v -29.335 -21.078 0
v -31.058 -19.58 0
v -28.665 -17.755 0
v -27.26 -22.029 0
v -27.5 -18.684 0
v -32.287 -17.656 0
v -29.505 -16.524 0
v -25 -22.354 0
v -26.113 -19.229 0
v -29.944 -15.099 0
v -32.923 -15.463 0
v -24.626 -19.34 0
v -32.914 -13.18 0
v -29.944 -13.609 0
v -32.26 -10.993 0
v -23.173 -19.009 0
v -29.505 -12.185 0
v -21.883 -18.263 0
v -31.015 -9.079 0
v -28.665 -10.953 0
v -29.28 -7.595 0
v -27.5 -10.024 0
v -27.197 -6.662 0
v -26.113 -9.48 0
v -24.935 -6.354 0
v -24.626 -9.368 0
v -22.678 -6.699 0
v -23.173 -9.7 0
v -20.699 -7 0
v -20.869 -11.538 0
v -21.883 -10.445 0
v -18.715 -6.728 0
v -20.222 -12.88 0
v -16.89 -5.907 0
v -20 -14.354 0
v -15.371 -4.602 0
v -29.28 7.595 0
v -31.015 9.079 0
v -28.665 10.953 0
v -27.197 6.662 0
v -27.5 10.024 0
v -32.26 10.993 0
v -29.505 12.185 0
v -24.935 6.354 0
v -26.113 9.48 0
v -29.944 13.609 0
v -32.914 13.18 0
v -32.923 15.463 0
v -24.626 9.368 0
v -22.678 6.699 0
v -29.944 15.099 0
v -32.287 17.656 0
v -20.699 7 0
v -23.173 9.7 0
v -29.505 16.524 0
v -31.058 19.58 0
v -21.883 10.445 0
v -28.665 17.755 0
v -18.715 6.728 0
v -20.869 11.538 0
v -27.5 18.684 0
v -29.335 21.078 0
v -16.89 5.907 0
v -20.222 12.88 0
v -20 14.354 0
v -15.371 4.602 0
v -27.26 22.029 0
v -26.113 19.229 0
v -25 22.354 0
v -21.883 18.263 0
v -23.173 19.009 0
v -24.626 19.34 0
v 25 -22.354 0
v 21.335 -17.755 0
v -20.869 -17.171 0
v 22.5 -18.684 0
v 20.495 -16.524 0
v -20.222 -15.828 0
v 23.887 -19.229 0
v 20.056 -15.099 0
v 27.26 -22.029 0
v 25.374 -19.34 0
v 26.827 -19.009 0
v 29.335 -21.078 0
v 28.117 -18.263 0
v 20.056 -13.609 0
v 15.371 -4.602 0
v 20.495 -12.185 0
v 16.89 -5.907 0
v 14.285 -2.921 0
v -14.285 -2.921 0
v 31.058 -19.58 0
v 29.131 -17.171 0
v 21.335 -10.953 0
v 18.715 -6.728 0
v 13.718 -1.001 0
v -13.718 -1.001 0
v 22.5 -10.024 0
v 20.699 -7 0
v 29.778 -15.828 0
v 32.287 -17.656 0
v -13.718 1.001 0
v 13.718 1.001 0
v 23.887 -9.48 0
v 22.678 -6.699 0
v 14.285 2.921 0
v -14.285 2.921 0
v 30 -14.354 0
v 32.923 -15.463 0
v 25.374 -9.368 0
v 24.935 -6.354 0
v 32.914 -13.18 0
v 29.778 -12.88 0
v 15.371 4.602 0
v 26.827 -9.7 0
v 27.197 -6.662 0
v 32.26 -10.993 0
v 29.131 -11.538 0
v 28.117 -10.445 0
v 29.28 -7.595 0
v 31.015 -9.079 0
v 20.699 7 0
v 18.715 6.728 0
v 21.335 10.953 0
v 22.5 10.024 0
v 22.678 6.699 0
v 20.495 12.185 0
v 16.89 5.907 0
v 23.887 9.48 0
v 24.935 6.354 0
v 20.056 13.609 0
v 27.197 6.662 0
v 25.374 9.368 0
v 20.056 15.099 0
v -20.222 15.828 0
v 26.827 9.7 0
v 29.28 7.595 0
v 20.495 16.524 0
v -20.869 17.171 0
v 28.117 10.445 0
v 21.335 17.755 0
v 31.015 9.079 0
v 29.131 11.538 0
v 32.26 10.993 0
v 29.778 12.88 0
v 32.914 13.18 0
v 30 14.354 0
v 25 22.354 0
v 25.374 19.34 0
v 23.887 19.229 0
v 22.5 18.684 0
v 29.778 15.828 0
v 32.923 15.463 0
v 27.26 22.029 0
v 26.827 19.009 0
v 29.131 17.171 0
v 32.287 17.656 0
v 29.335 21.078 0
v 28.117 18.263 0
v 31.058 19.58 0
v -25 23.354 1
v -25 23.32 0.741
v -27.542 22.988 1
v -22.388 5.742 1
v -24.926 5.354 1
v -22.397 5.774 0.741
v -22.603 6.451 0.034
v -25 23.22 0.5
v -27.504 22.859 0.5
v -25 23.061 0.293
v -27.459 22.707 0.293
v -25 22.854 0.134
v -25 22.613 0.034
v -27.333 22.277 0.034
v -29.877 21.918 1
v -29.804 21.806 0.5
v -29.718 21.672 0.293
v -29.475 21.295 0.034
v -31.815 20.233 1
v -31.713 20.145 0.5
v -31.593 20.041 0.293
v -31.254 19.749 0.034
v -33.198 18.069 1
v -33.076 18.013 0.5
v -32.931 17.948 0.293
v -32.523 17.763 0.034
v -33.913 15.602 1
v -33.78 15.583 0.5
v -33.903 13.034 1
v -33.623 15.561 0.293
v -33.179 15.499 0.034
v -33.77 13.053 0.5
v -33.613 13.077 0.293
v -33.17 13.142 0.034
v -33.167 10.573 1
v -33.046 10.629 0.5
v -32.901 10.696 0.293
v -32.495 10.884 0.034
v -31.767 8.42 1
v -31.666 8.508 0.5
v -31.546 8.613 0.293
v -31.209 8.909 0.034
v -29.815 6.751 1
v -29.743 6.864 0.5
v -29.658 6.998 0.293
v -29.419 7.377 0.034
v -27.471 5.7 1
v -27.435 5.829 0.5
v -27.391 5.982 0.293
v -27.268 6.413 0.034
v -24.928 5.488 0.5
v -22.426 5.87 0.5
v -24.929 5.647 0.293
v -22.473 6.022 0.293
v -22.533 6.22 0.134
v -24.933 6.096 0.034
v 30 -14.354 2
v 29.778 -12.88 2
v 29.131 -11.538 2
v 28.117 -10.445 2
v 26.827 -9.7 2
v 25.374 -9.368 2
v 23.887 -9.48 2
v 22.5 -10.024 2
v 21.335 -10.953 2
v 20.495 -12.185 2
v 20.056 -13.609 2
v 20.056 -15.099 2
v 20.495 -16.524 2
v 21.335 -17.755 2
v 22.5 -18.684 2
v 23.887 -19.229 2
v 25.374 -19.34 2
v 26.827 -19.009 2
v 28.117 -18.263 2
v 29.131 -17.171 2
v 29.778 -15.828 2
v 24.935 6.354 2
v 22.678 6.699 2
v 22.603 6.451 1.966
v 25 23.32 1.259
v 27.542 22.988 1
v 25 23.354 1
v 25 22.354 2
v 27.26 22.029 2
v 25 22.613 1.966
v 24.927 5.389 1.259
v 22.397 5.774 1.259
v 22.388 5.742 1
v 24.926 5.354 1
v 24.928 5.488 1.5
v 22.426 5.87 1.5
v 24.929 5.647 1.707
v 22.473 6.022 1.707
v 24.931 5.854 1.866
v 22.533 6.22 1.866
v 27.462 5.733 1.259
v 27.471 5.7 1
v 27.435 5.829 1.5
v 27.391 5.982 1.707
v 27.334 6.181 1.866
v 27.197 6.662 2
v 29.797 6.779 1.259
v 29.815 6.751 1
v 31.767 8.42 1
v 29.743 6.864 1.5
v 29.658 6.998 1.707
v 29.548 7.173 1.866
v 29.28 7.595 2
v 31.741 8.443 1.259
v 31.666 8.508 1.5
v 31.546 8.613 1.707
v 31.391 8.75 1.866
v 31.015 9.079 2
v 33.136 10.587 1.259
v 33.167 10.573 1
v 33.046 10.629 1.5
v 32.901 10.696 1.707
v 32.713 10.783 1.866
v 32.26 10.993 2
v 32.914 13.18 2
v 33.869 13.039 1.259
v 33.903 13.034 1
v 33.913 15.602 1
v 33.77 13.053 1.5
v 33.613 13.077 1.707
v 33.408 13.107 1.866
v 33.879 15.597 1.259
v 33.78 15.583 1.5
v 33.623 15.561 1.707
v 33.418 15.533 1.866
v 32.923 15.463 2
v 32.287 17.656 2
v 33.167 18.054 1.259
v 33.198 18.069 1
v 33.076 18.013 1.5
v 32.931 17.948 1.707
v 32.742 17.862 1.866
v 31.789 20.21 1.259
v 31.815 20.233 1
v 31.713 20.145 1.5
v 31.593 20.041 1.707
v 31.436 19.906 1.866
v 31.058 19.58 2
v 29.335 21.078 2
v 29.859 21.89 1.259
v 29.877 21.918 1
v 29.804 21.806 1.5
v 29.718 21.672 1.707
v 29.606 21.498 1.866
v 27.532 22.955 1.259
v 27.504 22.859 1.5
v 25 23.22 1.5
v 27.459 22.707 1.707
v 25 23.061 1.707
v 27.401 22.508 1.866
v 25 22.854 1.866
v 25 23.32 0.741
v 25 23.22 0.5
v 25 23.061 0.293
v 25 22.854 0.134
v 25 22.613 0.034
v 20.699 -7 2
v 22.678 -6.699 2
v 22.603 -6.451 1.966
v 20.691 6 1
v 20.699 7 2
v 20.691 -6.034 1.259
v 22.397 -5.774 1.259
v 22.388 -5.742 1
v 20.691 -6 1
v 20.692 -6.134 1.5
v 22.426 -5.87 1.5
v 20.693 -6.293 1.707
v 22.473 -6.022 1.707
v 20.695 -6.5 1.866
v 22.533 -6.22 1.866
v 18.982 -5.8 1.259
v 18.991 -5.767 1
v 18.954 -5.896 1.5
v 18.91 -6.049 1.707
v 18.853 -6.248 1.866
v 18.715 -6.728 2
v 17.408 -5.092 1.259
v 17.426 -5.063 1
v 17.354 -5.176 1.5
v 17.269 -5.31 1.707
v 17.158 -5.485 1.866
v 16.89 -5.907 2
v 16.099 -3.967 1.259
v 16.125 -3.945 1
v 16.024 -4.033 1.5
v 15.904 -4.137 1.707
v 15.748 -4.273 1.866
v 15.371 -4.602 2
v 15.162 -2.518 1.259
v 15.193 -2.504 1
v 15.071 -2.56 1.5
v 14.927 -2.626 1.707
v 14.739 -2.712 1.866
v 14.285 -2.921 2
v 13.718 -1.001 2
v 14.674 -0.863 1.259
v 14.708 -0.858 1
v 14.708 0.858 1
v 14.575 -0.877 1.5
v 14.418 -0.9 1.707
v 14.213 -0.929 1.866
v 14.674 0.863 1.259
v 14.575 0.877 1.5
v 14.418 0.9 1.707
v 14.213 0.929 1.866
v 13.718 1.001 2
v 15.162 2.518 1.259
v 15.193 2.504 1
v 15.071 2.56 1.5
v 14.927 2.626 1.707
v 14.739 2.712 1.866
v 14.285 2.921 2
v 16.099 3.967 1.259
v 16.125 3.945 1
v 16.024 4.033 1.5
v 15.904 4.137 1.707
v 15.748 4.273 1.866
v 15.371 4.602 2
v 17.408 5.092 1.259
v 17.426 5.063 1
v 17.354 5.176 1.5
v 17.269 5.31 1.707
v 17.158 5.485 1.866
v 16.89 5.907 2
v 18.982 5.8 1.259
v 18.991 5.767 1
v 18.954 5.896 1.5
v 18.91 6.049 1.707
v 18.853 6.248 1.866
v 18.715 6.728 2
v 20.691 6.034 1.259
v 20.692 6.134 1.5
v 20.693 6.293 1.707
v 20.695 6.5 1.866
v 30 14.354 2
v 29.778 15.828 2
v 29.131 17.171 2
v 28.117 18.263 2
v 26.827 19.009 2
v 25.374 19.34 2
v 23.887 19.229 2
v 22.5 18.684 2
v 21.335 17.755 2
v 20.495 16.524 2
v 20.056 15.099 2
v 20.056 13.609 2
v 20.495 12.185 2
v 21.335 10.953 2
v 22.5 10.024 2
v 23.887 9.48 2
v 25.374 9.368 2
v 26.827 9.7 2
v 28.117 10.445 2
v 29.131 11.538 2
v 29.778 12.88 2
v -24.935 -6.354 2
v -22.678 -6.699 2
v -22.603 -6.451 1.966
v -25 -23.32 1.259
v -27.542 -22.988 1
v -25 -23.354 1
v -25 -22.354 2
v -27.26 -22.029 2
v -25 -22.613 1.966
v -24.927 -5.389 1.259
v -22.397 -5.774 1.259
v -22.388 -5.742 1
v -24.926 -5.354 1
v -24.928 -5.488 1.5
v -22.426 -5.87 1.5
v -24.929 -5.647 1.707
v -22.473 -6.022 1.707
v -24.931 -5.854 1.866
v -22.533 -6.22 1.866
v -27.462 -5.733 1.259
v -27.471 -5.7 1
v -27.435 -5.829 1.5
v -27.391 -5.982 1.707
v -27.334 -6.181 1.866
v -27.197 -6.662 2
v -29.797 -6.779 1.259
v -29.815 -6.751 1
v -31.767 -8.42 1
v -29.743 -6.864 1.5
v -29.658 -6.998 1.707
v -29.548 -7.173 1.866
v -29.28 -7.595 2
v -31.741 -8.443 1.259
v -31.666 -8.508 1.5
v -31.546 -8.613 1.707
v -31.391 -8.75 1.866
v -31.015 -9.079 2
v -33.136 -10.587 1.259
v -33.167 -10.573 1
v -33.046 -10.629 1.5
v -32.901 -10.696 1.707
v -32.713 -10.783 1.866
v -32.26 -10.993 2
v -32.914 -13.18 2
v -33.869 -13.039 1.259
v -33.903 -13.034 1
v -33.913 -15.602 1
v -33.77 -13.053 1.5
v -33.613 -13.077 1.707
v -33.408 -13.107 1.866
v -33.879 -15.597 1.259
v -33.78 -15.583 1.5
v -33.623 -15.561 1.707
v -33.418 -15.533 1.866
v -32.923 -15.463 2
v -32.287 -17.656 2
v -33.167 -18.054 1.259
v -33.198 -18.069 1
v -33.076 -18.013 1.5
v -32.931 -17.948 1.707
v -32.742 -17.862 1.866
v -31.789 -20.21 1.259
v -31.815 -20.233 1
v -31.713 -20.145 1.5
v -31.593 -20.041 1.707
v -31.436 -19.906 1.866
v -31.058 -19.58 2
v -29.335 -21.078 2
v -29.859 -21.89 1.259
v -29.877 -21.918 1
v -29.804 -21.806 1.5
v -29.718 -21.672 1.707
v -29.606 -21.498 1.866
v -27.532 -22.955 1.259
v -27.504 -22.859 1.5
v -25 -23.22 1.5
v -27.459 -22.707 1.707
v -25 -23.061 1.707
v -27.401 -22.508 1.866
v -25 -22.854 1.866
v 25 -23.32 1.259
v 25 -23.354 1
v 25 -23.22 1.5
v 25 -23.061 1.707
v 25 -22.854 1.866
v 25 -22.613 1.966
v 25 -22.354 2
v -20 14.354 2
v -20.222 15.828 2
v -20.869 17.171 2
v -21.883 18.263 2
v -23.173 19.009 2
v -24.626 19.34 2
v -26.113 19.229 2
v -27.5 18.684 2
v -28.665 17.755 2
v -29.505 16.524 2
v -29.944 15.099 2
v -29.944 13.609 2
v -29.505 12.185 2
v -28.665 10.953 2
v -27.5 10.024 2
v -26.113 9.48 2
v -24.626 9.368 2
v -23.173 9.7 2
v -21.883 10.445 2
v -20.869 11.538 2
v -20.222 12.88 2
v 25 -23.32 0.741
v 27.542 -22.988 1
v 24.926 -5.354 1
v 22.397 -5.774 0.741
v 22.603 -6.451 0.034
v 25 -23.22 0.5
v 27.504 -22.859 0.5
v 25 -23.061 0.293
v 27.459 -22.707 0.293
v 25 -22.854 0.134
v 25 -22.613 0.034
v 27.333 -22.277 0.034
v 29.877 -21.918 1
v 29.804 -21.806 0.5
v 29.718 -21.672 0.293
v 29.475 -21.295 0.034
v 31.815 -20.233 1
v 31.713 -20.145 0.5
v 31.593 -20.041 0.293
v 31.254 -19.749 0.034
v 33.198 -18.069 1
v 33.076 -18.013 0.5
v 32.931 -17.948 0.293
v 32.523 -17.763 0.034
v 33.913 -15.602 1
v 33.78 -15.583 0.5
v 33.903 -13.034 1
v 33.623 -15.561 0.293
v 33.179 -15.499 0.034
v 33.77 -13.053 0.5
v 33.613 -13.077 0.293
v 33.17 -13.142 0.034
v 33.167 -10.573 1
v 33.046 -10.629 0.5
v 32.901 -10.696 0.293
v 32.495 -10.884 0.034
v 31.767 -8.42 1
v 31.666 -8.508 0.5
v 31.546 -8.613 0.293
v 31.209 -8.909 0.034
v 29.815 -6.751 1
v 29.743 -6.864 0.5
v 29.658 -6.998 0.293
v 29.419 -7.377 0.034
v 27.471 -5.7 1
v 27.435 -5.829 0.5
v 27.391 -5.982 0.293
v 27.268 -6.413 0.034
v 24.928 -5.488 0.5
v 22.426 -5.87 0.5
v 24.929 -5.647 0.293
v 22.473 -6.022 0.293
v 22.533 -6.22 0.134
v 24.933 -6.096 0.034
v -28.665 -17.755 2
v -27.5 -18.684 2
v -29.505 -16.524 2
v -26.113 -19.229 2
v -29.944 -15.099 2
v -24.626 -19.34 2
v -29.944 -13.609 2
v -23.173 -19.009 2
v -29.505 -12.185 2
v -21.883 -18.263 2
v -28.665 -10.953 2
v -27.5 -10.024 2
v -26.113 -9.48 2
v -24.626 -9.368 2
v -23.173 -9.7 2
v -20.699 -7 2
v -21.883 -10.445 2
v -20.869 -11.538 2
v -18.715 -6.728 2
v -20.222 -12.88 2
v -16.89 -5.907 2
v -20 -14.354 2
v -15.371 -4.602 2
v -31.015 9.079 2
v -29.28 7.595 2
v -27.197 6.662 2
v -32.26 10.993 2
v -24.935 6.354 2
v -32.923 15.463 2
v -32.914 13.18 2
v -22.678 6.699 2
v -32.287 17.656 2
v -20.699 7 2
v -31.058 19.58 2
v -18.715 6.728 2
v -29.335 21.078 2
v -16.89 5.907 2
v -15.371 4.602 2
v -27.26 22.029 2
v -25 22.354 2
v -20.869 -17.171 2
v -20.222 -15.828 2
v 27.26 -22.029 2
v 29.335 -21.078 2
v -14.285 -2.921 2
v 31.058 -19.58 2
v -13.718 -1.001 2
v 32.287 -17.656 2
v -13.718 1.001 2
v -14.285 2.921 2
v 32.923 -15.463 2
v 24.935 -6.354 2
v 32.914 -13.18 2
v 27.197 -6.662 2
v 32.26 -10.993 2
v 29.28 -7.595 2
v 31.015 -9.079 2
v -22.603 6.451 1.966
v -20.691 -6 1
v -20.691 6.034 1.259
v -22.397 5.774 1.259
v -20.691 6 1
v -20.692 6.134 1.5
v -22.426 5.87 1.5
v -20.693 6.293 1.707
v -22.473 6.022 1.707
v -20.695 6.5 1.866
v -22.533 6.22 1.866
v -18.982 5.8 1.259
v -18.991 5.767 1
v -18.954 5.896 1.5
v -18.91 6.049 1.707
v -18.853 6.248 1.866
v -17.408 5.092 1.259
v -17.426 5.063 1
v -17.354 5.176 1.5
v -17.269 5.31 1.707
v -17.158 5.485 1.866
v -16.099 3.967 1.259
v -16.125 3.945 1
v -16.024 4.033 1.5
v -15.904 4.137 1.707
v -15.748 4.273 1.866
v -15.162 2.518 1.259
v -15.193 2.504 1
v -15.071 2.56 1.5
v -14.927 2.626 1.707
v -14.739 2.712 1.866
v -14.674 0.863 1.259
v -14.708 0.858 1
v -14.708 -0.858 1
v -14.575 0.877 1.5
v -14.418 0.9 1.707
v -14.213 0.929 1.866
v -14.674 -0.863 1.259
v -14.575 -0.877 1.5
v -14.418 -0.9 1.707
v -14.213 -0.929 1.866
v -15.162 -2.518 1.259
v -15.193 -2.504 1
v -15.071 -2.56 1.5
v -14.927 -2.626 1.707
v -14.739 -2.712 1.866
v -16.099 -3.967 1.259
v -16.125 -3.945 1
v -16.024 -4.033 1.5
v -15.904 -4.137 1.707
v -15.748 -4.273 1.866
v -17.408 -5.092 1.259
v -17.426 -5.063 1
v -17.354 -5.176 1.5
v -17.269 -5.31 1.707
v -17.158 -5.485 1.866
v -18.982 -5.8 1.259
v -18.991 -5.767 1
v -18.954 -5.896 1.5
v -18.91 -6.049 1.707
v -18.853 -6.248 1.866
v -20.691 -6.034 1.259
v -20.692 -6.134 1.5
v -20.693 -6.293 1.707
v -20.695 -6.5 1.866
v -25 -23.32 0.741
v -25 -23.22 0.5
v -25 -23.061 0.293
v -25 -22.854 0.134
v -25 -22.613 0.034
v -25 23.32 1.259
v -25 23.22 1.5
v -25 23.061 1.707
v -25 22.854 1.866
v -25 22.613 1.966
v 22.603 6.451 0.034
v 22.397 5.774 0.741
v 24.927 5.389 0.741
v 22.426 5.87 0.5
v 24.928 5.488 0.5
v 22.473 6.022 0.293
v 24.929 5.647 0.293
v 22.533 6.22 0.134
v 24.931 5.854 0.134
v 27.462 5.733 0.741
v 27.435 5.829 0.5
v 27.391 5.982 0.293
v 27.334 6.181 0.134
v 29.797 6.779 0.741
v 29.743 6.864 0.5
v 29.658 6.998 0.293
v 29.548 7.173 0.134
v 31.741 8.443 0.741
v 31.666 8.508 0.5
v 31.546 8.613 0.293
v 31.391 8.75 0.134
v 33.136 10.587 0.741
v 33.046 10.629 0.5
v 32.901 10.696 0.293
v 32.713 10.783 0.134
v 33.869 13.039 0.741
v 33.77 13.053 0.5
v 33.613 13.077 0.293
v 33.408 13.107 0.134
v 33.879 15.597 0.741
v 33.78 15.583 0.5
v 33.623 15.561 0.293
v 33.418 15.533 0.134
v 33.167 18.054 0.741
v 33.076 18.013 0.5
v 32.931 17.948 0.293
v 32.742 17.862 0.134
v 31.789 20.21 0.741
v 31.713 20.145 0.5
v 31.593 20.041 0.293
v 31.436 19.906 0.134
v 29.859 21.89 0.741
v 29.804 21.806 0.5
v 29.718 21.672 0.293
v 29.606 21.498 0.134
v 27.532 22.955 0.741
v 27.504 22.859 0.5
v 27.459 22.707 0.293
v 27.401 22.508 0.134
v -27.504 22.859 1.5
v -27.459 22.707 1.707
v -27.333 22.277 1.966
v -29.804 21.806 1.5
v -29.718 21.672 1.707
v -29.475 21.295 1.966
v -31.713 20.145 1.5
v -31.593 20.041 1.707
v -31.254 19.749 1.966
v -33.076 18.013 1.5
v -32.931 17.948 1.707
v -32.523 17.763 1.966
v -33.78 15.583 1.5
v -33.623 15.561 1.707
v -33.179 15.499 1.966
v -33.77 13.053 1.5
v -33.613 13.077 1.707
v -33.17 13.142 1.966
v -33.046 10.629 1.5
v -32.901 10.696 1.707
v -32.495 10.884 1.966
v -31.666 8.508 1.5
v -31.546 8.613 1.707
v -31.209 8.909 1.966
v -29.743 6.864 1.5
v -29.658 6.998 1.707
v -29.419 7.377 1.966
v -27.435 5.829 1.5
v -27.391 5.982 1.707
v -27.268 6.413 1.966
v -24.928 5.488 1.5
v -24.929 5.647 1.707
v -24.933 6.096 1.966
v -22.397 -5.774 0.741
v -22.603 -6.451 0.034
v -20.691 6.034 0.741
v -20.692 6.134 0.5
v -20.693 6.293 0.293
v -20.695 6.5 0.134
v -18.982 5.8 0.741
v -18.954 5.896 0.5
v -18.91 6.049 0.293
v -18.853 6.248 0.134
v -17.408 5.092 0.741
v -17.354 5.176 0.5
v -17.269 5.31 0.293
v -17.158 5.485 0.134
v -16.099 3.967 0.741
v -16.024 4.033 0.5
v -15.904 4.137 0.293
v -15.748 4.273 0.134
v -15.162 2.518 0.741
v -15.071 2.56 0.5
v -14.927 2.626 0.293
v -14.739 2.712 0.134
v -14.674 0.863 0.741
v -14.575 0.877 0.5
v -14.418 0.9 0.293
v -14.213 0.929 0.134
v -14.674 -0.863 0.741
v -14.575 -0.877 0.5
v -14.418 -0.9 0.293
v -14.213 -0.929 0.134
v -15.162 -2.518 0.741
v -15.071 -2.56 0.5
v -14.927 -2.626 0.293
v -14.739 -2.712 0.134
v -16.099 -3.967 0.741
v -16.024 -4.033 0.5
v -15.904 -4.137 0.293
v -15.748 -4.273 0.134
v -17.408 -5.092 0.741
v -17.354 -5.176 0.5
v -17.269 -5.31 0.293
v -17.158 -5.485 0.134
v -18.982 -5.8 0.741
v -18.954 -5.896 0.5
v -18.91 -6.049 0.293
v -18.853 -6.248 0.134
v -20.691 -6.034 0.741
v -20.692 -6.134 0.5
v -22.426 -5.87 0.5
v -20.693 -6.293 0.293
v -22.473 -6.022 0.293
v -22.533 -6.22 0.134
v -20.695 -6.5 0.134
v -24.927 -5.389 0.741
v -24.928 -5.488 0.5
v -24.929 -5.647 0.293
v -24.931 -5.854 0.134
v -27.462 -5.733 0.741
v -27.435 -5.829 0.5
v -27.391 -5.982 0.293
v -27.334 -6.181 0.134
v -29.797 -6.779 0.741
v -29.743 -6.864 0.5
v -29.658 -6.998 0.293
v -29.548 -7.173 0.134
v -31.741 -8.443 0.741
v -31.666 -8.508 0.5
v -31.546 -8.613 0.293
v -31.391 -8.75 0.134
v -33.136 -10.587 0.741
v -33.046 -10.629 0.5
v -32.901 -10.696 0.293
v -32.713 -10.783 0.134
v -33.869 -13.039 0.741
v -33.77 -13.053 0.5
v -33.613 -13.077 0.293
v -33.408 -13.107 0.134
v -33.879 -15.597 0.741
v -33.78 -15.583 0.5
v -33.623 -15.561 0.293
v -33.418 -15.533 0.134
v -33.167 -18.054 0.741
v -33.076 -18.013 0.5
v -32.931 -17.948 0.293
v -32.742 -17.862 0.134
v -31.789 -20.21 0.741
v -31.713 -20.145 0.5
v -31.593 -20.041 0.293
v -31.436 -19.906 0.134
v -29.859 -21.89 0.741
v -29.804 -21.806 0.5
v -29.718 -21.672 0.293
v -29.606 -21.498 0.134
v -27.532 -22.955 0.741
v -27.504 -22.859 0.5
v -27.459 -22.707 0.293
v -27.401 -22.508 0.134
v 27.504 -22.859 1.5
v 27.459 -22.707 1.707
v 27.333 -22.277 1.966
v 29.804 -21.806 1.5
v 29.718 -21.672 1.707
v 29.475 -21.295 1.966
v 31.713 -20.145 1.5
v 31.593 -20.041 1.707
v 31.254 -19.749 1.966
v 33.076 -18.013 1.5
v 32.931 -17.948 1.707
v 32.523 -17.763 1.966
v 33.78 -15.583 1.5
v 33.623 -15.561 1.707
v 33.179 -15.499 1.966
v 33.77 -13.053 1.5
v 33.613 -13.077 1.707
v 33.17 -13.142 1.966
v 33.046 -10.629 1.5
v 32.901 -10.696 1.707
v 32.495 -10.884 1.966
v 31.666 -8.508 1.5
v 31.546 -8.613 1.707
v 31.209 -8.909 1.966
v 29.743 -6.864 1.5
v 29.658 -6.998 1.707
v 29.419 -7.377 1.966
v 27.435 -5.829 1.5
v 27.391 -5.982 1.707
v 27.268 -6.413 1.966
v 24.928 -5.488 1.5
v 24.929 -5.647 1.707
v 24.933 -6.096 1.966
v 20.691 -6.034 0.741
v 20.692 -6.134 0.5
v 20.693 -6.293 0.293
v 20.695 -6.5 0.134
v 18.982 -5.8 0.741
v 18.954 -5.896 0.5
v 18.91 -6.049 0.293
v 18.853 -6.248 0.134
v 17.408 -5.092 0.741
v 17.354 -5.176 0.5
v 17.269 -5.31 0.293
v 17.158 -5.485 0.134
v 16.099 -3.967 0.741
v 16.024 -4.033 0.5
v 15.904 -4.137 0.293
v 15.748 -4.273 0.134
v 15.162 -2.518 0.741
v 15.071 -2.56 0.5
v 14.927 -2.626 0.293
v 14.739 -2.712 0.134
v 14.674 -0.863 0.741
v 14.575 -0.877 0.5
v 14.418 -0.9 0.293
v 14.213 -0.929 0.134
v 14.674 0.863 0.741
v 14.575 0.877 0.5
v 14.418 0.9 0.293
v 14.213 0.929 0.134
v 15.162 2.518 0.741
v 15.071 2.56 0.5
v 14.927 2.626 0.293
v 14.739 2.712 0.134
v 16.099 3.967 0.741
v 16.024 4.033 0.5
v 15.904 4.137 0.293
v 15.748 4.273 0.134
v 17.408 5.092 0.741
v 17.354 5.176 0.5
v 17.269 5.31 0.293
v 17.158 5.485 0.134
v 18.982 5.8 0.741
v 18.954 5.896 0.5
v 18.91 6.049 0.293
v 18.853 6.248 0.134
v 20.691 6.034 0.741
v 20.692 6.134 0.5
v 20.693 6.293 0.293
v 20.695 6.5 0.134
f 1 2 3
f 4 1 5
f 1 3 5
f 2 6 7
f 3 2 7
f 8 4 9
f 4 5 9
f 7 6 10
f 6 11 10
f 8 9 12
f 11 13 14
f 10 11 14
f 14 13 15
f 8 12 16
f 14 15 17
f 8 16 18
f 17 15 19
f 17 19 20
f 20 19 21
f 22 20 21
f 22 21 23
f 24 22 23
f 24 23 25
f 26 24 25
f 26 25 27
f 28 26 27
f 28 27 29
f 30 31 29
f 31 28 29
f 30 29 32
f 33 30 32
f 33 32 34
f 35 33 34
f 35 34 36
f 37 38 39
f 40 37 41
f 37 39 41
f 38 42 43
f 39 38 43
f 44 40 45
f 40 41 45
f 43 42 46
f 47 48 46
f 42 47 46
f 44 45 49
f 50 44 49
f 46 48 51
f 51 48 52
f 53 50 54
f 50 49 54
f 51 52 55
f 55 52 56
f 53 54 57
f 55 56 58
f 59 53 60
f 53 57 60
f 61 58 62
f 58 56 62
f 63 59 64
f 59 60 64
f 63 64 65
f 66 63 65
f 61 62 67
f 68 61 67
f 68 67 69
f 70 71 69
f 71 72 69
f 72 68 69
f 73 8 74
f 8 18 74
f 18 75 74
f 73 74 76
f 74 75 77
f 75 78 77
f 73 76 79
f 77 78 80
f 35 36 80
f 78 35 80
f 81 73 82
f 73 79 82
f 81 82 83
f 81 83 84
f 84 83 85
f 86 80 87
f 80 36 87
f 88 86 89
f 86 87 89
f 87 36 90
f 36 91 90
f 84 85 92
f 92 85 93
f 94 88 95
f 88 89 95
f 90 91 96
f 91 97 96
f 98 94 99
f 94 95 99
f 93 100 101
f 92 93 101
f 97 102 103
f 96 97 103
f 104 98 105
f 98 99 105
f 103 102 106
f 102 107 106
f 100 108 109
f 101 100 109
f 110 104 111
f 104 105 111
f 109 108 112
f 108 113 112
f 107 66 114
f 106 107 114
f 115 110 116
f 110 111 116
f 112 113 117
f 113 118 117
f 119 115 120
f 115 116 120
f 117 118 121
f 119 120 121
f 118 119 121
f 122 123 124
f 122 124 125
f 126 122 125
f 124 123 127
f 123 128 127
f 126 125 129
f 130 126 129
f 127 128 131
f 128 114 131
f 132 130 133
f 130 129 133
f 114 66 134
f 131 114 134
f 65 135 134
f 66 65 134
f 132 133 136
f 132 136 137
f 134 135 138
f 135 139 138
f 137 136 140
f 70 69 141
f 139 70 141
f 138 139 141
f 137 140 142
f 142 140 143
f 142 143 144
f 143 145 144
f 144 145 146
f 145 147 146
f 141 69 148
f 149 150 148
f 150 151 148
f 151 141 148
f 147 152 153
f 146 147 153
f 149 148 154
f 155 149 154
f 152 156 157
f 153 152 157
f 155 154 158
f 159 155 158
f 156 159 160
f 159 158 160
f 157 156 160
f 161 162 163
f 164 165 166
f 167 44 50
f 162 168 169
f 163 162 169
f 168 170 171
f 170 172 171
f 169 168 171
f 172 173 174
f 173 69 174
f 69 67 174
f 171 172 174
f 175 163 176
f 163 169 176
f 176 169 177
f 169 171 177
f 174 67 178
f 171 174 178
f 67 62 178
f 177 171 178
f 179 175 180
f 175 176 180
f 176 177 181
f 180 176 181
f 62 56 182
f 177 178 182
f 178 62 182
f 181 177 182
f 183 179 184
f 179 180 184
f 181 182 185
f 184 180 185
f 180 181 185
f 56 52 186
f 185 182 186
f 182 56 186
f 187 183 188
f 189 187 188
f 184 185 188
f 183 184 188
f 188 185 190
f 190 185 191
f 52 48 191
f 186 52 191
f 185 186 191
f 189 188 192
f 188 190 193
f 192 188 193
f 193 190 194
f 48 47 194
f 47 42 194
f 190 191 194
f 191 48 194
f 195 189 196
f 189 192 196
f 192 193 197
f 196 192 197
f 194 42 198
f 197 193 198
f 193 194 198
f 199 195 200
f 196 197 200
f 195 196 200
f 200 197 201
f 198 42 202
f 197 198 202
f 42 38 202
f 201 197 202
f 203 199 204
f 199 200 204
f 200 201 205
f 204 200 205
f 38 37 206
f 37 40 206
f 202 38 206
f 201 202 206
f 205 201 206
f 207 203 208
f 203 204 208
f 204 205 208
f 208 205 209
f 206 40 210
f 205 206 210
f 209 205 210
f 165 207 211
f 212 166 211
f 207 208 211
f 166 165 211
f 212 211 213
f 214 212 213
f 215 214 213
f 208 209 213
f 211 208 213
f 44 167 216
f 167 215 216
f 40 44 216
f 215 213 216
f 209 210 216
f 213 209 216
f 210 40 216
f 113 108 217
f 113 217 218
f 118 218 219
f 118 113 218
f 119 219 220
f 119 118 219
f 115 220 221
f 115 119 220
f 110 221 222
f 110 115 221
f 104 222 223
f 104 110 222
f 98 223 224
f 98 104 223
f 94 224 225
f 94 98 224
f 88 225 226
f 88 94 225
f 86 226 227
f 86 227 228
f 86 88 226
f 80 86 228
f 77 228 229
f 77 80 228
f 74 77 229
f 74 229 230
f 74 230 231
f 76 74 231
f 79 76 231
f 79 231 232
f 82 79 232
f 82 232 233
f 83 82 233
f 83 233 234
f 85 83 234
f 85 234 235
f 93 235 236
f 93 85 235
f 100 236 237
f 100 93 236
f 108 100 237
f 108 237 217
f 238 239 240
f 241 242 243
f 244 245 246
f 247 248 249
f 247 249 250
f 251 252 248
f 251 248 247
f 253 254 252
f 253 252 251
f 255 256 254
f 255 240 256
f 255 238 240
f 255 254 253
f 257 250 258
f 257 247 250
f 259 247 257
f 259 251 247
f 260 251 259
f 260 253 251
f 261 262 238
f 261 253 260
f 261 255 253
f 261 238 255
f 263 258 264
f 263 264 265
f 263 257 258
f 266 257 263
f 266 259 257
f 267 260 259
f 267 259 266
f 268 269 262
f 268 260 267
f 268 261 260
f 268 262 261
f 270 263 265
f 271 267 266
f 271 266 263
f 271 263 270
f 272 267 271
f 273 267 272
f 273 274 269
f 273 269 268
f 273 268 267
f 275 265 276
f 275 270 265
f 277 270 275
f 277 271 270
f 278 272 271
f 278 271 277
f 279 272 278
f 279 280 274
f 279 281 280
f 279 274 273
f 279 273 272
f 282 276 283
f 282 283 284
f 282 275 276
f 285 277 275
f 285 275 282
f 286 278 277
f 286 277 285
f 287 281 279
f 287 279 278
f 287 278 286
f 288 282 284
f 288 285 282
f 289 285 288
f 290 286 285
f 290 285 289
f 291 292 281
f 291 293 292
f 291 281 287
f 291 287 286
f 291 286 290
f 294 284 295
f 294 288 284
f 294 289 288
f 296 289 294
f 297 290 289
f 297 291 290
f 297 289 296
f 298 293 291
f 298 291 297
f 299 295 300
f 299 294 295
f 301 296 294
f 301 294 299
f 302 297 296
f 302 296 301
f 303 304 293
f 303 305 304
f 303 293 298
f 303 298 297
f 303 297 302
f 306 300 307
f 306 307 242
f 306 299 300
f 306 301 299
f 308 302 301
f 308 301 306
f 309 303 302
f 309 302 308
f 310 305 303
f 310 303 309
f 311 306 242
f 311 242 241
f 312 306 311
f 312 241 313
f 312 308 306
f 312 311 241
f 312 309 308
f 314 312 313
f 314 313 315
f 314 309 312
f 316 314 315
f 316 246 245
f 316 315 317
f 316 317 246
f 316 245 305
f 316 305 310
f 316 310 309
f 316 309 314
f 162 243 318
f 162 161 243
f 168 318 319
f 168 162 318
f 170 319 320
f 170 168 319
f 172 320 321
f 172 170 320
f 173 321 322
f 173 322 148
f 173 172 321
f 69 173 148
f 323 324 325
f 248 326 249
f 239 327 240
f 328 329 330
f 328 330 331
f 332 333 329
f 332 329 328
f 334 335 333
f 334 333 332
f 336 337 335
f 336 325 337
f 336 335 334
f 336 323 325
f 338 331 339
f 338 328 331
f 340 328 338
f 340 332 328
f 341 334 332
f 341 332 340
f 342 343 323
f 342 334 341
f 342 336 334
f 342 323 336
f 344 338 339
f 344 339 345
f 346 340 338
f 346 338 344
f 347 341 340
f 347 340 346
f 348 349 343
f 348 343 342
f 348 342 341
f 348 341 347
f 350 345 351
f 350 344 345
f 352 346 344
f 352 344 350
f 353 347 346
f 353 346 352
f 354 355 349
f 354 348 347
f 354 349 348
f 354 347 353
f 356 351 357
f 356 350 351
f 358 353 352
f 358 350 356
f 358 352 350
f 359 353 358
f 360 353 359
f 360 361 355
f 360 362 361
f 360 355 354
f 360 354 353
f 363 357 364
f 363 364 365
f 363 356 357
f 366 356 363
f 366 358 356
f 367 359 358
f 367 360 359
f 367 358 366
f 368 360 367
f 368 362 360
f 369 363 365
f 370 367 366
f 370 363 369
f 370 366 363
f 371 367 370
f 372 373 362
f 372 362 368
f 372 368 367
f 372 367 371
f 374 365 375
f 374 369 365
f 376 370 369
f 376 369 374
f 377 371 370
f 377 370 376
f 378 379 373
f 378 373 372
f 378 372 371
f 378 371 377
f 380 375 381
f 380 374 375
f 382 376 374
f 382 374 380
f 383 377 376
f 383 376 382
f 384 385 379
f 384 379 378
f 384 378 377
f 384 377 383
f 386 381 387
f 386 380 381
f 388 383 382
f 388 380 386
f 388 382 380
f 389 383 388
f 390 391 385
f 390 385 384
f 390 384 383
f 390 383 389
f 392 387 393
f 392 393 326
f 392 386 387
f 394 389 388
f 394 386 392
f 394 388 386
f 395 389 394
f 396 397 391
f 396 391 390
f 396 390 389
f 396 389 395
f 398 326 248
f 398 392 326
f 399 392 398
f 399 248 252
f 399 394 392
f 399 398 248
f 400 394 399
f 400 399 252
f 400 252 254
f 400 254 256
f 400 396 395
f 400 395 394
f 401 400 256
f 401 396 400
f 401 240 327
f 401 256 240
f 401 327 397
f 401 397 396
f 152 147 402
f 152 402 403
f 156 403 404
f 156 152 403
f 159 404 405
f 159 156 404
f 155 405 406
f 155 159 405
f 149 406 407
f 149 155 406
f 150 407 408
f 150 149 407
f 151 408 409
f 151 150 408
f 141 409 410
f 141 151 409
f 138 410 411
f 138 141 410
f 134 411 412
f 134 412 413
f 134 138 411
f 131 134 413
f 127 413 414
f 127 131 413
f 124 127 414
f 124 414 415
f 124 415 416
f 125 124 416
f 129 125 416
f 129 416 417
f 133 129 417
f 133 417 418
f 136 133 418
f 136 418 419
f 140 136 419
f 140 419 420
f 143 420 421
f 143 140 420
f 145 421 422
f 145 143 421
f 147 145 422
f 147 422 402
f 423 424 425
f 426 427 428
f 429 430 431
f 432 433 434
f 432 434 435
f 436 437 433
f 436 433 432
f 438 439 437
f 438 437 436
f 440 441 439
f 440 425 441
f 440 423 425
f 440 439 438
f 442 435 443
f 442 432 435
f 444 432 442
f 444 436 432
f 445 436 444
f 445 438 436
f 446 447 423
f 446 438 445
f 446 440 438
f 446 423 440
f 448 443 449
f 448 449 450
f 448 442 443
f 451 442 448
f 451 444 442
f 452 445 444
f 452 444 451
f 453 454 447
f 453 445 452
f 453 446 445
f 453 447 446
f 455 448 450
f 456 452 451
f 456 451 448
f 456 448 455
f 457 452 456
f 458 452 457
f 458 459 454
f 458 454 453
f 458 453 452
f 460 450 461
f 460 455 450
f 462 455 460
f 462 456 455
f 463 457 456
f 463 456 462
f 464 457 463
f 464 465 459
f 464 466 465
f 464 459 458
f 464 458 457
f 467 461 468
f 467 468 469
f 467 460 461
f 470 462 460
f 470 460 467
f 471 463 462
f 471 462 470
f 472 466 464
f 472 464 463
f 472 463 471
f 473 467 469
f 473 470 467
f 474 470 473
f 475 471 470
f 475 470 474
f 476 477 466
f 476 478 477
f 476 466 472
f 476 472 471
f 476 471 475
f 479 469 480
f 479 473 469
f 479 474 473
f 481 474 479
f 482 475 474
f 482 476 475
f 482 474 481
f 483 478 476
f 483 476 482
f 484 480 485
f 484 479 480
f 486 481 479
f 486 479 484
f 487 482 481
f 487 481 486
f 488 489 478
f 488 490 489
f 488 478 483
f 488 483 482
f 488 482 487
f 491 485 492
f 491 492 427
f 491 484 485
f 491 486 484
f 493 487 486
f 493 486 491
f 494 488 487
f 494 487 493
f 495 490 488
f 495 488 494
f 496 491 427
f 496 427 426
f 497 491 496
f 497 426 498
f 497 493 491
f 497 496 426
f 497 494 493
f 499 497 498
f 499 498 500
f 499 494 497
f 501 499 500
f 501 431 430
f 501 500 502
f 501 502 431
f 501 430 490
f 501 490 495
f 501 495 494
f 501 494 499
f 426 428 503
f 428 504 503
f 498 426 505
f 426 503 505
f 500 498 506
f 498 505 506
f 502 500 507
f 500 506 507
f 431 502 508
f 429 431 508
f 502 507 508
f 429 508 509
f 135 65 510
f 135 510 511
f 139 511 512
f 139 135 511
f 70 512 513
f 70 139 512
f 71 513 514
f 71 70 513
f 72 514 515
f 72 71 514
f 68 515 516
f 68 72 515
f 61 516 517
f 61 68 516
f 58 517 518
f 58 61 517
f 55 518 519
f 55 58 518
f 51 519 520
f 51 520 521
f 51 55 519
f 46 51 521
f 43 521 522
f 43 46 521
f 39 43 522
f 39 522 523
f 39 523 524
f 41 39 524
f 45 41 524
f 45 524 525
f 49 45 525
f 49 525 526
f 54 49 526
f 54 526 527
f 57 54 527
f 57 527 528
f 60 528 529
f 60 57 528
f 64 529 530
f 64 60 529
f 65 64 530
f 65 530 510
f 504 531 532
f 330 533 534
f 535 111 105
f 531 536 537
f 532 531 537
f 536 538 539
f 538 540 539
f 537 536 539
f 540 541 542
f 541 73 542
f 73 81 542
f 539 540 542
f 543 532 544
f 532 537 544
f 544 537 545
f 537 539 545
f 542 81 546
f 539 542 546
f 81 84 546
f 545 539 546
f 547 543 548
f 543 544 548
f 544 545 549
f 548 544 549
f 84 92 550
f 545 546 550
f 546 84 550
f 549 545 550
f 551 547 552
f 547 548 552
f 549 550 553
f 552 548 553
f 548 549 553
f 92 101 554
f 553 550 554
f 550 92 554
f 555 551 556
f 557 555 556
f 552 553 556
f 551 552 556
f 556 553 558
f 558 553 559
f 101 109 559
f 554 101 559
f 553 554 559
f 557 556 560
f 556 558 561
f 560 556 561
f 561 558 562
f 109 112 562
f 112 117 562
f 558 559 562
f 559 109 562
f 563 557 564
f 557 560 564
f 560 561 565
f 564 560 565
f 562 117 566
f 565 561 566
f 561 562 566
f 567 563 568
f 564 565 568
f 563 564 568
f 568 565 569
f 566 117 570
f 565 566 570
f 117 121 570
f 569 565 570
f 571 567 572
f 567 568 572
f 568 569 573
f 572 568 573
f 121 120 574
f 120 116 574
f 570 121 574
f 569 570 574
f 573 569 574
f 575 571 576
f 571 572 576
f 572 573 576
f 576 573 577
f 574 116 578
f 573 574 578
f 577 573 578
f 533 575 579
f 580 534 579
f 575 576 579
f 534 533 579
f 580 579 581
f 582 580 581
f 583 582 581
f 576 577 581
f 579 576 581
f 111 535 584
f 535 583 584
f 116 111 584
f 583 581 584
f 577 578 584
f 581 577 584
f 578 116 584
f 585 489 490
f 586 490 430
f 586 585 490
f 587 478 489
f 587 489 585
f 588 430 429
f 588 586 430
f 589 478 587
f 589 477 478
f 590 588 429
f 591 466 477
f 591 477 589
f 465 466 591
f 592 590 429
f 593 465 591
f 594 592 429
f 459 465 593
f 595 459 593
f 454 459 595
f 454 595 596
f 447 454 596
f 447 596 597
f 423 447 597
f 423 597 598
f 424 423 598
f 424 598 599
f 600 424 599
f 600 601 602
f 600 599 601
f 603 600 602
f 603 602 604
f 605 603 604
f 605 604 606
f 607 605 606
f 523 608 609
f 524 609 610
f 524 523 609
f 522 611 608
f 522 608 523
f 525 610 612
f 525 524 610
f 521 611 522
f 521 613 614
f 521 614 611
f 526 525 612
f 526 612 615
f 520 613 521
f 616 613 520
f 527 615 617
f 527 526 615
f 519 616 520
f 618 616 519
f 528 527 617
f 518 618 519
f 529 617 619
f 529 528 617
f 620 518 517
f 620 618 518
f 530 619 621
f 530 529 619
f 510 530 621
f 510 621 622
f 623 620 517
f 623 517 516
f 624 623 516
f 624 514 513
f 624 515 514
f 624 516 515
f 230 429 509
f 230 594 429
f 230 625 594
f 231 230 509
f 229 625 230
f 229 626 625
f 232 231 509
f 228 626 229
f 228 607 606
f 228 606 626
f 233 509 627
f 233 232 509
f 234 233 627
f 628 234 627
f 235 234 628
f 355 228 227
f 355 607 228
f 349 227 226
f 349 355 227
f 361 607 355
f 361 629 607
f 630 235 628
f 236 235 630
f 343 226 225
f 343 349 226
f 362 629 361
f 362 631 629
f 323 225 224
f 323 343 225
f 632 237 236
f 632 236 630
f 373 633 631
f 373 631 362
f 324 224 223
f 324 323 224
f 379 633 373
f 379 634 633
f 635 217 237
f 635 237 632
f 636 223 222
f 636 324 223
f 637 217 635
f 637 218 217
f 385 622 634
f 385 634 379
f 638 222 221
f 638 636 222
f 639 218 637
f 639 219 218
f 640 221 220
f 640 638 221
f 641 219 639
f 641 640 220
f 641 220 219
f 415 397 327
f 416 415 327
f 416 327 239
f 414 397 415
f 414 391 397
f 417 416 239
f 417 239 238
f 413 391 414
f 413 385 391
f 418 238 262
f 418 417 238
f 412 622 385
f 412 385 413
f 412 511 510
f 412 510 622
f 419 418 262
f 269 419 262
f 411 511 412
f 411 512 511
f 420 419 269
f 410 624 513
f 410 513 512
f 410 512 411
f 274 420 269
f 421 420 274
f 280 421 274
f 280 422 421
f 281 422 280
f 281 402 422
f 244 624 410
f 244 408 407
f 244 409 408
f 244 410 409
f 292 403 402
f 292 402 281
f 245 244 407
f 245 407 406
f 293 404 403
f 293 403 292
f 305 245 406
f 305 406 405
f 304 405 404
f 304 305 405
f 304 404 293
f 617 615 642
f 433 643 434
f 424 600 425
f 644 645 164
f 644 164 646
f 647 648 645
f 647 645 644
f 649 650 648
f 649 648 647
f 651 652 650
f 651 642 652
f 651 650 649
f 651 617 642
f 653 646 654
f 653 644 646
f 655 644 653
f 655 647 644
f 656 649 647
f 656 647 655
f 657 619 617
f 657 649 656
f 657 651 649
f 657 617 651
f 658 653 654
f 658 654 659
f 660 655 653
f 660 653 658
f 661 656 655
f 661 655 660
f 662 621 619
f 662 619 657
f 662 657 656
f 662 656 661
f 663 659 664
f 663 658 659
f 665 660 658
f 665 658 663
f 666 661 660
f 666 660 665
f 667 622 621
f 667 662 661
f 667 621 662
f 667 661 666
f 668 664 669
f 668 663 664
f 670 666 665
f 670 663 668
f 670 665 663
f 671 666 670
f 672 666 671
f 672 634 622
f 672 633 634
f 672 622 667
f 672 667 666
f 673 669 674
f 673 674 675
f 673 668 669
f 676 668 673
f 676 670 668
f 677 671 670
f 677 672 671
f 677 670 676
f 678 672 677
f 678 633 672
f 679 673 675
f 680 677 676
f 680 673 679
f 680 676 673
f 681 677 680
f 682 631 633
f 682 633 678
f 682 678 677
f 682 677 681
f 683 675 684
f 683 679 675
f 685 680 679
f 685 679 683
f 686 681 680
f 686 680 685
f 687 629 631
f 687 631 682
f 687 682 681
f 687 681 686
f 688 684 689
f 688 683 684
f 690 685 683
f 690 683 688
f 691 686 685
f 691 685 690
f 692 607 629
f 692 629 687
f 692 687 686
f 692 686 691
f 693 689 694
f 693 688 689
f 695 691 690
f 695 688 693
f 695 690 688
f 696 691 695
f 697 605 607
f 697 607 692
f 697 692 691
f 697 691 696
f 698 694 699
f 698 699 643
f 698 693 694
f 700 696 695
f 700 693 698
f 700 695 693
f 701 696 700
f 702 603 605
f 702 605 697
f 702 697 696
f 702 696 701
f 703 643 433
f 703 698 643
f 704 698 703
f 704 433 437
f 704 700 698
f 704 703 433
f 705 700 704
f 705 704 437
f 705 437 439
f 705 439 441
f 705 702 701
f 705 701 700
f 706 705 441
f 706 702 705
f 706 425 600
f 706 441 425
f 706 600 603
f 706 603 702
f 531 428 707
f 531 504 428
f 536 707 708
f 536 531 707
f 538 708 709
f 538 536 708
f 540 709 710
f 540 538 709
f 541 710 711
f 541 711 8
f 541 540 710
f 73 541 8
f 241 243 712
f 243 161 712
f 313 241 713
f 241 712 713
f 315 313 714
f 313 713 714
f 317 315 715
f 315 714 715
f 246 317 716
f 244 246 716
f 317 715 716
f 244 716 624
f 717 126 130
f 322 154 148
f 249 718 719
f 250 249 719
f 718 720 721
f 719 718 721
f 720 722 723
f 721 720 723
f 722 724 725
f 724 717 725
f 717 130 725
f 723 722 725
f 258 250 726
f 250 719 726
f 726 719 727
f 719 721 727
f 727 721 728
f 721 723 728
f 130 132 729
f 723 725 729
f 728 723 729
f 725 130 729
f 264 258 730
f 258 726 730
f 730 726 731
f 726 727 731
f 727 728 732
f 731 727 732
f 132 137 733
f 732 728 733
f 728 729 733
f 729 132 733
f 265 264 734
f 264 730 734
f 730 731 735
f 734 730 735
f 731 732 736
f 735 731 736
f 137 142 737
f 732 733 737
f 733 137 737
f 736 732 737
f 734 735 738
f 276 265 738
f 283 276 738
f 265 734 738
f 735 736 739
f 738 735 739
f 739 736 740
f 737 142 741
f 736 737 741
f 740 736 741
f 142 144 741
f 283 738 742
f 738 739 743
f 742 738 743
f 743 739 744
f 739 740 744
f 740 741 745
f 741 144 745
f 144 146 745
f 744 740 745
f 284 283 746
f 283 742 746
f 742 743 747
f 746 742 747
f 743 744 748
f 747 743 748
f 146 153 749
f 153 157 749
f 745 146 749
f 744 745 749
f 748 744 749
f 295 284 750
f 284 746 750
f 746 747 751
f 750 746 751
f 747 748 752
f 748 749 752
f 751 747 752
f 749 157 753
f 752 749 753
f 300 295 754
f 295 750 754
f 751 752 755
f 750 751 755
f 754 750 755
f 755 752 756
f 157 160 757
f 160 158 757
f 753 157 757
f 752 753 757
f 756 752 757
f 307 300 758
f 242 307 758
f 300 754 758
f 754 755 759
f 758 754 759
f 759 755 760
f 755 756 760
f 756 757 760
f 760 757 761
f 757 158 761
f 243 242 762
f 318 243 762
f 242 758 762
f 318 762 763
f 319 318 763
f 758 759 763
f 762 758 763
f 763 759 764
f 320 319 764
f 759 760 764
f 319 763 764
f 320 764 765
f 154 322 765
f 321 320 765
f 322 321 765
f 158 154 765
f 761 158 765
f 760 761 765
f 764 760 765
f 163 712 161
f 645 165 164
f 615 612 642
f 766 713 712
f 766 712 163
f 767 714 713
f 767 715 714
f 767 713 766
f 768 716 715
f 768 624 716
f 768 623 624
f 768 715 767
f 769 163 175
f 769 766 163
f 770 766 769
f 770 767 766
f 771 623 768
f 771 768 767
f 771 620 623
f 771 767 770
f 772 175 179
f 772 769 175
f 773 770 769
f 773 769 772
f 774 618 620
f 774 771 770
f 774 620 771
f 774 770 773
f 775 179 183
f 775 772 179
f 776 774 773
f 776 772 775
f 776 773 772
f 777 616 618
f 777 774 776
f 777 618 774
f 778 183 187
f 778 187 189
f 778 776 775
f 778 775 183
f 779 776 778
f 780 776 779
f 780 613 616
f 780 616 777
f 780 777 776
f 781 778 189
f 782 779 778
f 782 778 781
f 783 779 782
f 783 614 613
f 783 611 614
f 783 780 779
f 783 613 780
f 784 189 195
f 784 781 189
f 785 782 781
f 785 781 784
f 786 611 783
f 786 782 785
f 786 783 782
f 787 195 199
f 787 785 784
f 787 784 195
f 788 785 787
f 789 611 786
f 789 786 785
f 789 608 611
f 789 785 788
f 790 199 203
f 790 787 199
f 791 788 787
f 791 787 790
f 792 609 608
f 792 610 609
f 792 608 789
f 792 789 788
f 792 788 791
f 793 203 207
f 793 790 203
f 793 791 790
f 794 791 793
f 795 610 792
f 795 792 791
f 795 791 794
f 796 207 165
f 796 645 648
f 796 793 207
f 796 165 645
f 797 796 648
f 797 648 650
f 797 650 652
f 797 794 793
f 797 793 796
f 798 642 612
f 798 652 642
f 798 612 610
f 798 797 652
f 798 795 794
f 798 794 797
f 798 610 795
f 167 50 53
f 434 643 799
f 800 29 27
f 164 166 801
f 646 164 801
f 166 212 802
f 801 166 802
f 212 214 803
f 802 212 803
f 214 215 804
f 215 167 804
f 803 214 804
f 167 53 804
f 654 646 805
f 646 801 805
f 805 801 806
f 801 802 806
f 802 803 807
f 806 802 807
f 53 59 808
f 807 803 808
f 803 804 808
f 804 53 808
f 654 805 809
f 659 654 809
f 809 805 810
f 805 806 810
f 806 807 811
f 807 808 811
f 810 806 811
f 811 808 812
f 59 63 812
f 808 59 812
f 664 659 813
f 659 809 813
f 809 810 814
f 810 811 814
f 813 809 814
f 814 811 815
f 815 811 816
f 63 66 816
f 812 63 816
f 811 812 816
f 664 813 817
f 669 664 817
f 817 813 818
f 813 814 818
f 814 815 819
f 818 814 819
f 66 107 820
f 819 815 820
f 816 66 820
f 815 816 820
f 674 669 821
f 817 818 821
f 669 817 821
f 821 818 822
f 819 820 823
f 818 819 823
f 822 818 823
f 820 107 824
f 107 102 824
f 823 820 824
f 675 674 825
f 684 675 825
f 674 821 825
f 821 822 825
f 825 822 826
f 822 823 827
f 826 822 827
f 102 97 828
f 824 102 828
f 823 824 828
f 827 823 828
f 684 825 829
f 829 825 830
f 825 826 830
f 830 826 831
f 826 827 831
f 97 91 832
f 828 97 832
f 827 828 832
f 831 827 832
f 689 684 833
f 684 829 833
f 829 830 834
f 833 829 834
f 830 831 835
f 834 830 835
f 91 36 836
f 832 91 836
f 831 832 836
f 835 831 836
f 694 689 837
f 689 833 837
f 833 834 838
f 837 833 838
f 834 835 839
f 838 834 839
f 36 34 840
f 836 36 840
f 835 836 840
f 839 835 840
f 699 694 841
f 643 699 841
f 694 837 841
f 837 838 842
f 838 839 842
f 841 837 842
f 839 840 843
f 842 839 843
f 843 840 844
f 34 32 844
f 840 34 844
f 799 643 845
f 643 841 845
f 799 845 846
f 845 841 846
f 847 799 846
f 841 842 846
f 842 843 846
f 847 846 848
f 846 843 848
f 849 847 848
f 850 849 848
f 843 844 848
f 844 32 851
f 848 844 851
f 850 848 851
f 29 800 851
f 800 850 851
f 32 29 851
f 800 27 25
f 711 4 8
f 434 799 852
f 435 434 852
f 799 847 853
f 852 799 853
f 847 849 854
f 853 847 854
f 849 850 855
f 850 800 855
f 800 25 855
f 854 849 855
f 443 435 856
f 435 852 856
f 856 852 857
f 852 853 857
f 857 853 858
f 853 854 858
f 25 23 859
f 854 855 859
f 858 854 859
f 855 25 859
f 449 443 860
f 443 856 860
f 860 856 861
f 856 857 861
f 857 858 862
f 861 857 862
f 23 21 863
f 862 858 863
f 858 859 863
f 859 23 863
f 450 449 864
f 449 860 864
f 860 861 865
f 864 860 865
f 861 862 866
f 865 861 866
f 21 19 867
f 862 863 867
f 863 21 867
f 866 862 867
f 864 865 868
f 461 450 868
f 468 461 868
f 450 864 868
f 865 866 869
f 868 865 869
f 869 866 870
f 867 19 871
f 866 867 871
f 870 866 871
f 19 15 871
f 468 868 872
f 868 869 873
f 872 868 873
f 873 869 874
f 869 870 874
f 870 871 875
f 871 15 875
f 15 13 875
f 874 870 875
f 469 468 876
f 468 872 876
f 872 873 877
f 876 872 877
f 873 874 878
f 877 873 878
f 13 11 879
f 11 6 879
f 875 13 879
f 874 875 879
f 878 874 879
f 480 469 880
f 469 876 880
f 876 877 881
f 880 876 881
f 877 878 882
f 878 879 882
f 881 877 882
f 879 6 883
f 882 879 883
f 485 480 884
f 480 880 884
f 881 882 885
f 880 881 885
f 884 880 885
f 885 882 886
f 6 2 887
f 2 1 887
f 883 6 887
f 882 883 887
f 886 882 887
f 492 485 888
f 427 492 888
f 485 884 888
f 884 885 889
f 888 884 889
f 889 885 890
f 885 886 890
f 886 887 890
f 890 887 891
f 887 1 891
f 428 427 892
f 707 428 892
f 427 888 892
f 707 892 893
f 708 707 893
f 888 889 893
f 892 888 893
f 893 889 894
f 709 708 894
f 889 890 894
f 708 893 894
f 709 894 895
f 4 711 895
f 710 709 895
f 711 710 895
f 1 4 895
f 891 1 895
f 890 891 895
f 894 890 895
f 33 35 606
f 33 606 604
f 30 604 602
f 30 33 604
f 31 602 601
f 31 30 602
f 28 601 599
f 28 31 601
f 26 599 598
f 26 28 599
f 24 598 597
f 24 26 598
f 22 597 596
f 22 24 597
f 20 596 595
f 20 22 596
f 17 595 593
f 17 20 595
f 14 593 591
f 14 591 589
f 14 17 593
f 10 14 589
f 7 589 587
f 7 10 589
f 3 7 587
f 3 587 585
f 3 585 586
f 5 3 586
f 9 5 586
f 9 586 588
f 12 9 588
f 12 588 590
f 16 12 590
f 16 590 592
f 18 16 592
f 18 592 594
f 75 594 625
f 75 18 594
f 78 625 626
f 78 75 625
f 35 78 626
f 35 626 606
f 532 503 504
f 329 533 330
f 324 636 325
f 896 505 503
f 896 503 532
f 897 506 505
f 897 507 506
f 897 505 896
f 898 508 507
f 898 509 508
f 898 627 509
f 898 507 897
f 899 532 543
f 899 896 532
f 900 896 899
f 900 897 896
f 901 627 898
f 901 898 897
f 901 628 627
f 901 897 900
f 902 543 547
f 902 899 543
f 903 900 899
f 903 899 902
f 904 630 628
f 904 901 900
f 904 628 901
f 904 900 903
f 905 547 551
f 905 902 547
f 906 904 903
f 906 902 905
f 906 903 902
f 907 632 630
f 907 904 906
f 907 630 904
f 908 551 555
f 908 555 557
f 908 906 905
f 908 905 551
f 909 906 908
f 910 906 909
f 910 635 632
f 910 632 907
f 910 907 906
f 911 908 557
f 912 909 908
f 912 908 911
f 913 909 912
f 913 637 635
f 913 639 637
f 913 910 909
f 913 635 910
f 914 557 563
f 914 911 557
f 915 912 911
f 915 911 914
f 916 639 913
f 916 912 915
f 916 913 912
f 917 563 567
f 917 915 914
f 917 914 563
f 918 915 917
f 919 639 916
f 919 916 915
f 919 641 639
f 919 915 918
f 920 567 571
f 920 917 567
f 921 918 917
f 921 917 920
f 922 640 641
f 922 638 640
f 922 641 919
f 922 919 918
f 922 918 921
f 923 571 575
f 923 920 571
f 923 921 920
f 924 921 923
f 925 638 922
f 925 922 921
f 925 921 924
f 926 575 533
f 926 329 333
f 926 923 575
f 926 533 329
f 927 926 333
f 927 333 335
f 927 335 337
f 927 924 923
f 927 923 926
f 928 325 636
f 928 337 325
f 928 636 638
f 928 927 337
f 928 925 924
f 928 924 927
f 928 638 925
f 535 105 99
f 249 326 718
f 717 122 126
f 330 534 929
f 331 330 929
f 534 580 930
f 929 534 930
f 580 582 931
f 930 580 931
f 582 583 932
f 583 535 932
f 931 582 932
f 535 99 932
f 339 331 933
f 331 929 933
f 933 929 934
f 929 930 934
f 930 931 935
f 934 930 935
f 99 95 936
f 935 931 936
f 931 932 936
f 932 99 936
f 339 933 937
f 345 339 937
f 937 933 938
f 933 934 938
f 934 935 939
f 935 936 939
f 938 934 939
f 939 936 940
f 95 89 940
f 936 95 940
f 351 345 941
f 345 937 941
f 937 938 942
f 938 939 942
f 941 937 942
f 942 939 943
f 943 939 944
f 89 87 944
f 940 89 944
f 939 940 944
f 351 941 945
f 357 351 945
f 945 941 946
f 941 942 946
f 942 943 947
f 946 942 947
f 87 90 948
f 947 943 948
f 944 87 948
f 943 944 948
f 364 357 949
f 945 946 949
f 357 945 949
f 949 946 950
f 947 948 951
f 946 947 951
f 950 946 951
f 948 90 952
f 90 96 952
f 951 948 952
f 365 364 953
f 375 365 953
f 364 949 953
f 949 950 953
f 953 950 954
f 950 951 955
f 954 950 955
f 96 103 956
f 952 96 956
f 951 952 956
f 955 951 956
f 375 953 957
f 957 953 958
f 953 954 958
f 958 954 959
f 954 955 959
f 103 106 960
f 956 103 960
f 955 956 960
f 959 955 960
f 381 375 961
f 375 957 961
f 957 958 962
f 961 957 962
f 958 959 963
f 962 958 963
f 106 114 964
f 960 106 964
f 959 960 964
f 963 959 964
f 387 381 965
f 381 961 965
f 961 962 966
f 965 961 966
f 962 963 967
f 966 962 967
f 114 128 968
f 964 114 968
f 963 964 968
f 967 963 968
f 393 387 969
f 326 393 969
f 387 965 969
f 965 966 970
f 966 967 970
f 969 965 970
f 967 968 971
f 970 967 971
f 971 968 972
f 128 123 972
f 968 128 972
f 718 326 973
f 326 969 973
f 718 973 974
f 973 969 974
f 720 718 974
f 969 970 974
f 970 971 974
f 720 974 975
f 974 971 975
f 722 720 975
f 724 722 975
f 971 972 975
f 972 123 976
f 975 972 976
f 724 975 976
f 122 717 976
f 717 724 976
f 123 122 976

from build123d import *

# Parameters (mm, degrees)
SZKIC2_R                    = 5
DODANIE_WYCI_GNI_CIE1_DEPTH = 2
ZAOKR_GLENIE1_R             = 1


with BuildPart() as part:
    # Szkic2 → Dodanie-wyciągnięcie1 (new body)
    with BuildSketch(Plane.XY):
        with BuildLine():
            Line((25, 23.354152533), (-25, 23.354152533))
            ThreePointArc((-25, 23.354152533), (-33.902595792, 13.033626819), (-22.387531852, 5.741661013))
            ThreePointArc((-22.387531852, 5.741661013), (-14.64588642, 0), (-22.387531852, -5.741661013))
            ThreePointArc((-22.387531852, -5.741661013), (-33.902595792, -13.033626819), (-25, -23.354152533))
            Line((-25, -23.354152533), (25, -23.354152533))
            ThreePointArc((25, -23.354152533), (33.902595792, -13.033626819), (22.387531852, -5.741661013))
            ThreePointArc((22.387531852, -5.741661013), (14.64588642, 0), (22.387531852, 5.741661013))
            ThreePointArc((22.387531852, 5.741661013), (33.902595792, 13.033626819), (25, 23.354152533))
        make_face()
        with Locations((25, 14.354152533)):
            Circle(SZKIC2_R, mode=Mode.SUBTRACT)
        with Locations((-25, 14.354152533)):
            Circle(SZKIC2_R, mode=Mode.SUBTRACT)
        with Locations((25, -14.354152533)):
            Circle(SZKIC2_R, mode=Mode.SUBTRACT)
        with Locations((-25, -14.354152533)):
            Circle(SZKIC2_R, mode=Mode.SUBTRACT)
    extrude(amount=DODANIE_WYCI_GNI_CIE1_DEPTH)

    # Zaokrąglenie1
    zaokr_glenie1_edges = [part.edges().sort_by_distance(p)[0] for p in [
        (0, -23.354152533, 2),
        (0, -23.354152533, 0),
        (33.902595792, -13.033626819, 2),
        (33.902595792, -13.033626819, 0),
        (14.64588642, 0, 2),
        (14.64588642, 0, 0),
        (33.902595792, 13.033626819, 2),
        (33.902595792, 13.033626819, 0),
        (0, 23.354152533, 2),
        (0, 23.354152533, 0),
        (-33.902595792, 13.033626819, 2),
        (-33.902595792, 13.033626819, 0),
        (-33.902595792, -13.033626819, 2),
        (-33.902595792, -13.033626819, 0),
        (-14.64588642, 0, 2),
        (-14.64588642, 0, 0),
    ]]
    fillet(zaokr_glenie1_edges, radius=ZAOKR_GLENIE1_R - 0.0001)  # a hair under: the kernel refuses the full size


solid = part.part
